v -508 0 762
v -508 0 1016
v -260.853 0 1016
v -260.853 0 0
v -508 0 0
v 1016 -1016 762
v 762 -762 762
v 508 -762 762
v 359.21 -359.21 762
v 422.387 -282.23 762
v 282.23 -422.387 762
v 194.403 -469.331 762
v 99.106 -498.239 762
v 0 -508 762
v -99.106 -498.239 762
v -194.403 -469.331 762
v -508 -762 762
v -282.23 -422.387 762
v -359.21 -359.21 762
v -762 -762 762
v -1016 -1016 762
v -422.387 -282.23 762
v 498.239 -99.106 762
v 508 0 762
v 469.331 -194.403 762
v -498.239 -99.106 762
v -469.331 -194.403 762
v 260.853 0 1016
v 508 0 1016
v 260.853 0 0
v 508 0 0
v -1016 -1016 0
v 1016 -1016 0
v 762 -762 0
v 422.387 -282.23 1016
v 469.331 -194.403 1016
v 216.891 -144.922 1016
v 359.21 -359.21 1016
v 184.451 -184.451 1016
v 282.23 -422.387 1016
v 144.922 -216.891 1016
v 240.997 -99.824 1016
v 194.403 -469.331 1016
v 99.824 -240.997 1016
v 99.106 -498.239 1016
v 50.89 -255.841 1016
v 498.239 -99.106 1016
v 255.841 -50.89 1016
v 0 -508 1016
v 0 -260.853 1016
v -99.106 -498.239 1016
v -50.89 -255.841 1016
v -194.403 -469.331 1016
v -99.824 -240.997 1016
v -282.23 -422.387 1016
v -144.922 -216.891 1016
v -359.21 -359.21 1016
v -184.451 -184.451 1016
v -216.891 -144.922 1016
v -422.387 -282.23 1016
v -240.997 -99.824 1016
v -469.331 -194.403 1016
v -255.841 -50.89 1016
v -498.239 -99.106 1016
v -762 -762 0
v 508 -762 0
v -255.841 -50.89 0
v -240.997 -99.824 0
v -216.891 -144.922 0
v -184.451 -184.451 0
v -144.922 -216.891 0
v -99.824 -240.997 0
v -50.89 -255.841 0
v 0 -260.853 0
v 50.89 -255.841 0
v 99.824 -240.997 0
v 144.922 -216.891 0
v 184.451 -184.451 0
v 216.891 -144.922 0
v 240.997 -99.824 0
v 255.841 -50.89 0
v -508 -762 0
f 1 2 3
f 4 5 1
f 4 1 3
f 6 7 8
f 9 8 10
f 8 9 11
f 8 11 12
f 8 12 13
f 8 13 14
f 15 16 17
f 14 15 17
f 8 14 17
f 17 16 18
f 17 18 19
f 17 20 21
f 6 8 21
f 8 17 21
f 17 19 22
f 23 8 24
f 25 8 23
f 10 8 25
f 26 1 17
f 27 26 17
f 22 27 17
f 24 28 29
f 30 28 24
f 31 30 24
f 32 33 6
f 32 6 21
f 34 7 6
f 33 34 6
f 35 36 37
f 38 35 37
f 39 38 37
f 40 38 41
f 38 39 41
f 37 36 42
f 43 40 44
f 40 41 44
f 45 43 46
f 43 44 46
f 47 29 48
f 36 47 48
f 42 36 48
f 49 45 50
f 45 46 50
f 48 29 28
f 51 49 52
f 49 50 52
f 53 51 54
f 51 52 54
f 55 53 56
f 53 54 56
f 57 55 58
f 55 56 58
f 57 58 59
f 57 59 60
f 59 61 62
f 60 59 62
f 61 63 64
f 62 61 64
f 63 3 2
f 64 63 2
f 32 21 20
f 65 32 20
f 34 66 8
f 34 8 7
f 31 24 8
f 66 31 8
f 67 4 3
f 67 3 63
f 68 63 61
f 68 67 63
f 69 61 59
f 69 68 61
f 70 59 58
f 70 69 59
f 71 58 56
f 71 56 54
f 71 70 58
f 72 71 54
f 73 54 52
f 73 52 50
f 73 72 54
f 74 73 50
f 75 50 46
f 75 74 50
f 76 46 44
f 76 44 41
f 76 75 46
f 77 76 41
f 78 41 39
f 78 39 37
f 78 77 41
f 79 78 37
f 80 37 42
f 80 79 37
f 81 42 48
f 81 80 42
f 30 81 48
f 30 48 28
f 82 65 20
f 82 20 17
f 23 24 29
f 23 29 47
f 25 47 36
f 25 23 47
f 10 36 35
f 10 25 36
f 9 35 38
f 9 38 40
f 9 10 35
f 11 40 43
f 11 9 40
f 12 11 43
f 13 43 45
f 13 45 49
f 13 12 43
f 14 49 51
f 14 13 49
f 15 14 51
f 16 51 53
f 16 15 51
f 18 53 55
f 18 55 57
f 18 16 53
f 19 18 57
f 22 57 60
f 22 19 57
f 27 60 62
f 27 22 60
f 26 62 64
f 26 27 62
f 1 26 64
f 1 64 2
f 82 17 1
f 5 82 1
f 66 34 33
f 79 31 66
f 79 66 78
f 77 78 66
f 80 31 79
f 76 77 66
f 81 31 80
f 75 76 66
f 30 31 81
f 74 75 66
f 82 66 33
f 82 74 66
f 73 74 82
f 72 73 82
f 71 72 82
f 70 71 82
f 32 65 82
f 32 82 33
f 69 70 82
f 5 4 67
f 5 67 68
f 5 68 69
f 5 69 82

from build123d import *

# Parameters (mm, degrees)
BOSS_EXTRUDE1_DEPTH = 762
BOSS_EXTRUDE2_DEPTH = 1016


with BuildPart() as part:
    # Sketch1 → Boss-Extrude1 (new body)
    with BuildSketch(Plane.XY):
        with BuildLine():
            ThreePointArc((508, 0), (0, -508), (-508, 0))
            Line((-508, 0), (-508, -762))
            Line((-508, -762), (-762, -762))
            Line((-762, -762), (-1016, -1016))
            Line((-1016, -1016), (1016, -1016))
            Line((1016, -1016), (762, -762))
            Line((762, -762), (508, -762))
            Line((508, -762), (508, 0))
        make_face()
    extrude(amount=BOSS_EXTRUDE1_DEPTH)

    # Sketch1<3> → Boss-Extrude2 (add)
    with BuildSketch(Plane.XY):
        with BuildLine():
            ThreePointArc((260.853189007, 0), (0, -260.853189007), (-260.853189007, 0))
            Line((-260.853189007, 0), (-508, 0))
            ThreePointArc((-508, 0), (0, -508), (508, 0))
            Line((508, 0), (260.853189007, 0))
        make_face()
    extrude(amount=BOSS_EXTRUDE2_DEPTH)


solid = part.part
